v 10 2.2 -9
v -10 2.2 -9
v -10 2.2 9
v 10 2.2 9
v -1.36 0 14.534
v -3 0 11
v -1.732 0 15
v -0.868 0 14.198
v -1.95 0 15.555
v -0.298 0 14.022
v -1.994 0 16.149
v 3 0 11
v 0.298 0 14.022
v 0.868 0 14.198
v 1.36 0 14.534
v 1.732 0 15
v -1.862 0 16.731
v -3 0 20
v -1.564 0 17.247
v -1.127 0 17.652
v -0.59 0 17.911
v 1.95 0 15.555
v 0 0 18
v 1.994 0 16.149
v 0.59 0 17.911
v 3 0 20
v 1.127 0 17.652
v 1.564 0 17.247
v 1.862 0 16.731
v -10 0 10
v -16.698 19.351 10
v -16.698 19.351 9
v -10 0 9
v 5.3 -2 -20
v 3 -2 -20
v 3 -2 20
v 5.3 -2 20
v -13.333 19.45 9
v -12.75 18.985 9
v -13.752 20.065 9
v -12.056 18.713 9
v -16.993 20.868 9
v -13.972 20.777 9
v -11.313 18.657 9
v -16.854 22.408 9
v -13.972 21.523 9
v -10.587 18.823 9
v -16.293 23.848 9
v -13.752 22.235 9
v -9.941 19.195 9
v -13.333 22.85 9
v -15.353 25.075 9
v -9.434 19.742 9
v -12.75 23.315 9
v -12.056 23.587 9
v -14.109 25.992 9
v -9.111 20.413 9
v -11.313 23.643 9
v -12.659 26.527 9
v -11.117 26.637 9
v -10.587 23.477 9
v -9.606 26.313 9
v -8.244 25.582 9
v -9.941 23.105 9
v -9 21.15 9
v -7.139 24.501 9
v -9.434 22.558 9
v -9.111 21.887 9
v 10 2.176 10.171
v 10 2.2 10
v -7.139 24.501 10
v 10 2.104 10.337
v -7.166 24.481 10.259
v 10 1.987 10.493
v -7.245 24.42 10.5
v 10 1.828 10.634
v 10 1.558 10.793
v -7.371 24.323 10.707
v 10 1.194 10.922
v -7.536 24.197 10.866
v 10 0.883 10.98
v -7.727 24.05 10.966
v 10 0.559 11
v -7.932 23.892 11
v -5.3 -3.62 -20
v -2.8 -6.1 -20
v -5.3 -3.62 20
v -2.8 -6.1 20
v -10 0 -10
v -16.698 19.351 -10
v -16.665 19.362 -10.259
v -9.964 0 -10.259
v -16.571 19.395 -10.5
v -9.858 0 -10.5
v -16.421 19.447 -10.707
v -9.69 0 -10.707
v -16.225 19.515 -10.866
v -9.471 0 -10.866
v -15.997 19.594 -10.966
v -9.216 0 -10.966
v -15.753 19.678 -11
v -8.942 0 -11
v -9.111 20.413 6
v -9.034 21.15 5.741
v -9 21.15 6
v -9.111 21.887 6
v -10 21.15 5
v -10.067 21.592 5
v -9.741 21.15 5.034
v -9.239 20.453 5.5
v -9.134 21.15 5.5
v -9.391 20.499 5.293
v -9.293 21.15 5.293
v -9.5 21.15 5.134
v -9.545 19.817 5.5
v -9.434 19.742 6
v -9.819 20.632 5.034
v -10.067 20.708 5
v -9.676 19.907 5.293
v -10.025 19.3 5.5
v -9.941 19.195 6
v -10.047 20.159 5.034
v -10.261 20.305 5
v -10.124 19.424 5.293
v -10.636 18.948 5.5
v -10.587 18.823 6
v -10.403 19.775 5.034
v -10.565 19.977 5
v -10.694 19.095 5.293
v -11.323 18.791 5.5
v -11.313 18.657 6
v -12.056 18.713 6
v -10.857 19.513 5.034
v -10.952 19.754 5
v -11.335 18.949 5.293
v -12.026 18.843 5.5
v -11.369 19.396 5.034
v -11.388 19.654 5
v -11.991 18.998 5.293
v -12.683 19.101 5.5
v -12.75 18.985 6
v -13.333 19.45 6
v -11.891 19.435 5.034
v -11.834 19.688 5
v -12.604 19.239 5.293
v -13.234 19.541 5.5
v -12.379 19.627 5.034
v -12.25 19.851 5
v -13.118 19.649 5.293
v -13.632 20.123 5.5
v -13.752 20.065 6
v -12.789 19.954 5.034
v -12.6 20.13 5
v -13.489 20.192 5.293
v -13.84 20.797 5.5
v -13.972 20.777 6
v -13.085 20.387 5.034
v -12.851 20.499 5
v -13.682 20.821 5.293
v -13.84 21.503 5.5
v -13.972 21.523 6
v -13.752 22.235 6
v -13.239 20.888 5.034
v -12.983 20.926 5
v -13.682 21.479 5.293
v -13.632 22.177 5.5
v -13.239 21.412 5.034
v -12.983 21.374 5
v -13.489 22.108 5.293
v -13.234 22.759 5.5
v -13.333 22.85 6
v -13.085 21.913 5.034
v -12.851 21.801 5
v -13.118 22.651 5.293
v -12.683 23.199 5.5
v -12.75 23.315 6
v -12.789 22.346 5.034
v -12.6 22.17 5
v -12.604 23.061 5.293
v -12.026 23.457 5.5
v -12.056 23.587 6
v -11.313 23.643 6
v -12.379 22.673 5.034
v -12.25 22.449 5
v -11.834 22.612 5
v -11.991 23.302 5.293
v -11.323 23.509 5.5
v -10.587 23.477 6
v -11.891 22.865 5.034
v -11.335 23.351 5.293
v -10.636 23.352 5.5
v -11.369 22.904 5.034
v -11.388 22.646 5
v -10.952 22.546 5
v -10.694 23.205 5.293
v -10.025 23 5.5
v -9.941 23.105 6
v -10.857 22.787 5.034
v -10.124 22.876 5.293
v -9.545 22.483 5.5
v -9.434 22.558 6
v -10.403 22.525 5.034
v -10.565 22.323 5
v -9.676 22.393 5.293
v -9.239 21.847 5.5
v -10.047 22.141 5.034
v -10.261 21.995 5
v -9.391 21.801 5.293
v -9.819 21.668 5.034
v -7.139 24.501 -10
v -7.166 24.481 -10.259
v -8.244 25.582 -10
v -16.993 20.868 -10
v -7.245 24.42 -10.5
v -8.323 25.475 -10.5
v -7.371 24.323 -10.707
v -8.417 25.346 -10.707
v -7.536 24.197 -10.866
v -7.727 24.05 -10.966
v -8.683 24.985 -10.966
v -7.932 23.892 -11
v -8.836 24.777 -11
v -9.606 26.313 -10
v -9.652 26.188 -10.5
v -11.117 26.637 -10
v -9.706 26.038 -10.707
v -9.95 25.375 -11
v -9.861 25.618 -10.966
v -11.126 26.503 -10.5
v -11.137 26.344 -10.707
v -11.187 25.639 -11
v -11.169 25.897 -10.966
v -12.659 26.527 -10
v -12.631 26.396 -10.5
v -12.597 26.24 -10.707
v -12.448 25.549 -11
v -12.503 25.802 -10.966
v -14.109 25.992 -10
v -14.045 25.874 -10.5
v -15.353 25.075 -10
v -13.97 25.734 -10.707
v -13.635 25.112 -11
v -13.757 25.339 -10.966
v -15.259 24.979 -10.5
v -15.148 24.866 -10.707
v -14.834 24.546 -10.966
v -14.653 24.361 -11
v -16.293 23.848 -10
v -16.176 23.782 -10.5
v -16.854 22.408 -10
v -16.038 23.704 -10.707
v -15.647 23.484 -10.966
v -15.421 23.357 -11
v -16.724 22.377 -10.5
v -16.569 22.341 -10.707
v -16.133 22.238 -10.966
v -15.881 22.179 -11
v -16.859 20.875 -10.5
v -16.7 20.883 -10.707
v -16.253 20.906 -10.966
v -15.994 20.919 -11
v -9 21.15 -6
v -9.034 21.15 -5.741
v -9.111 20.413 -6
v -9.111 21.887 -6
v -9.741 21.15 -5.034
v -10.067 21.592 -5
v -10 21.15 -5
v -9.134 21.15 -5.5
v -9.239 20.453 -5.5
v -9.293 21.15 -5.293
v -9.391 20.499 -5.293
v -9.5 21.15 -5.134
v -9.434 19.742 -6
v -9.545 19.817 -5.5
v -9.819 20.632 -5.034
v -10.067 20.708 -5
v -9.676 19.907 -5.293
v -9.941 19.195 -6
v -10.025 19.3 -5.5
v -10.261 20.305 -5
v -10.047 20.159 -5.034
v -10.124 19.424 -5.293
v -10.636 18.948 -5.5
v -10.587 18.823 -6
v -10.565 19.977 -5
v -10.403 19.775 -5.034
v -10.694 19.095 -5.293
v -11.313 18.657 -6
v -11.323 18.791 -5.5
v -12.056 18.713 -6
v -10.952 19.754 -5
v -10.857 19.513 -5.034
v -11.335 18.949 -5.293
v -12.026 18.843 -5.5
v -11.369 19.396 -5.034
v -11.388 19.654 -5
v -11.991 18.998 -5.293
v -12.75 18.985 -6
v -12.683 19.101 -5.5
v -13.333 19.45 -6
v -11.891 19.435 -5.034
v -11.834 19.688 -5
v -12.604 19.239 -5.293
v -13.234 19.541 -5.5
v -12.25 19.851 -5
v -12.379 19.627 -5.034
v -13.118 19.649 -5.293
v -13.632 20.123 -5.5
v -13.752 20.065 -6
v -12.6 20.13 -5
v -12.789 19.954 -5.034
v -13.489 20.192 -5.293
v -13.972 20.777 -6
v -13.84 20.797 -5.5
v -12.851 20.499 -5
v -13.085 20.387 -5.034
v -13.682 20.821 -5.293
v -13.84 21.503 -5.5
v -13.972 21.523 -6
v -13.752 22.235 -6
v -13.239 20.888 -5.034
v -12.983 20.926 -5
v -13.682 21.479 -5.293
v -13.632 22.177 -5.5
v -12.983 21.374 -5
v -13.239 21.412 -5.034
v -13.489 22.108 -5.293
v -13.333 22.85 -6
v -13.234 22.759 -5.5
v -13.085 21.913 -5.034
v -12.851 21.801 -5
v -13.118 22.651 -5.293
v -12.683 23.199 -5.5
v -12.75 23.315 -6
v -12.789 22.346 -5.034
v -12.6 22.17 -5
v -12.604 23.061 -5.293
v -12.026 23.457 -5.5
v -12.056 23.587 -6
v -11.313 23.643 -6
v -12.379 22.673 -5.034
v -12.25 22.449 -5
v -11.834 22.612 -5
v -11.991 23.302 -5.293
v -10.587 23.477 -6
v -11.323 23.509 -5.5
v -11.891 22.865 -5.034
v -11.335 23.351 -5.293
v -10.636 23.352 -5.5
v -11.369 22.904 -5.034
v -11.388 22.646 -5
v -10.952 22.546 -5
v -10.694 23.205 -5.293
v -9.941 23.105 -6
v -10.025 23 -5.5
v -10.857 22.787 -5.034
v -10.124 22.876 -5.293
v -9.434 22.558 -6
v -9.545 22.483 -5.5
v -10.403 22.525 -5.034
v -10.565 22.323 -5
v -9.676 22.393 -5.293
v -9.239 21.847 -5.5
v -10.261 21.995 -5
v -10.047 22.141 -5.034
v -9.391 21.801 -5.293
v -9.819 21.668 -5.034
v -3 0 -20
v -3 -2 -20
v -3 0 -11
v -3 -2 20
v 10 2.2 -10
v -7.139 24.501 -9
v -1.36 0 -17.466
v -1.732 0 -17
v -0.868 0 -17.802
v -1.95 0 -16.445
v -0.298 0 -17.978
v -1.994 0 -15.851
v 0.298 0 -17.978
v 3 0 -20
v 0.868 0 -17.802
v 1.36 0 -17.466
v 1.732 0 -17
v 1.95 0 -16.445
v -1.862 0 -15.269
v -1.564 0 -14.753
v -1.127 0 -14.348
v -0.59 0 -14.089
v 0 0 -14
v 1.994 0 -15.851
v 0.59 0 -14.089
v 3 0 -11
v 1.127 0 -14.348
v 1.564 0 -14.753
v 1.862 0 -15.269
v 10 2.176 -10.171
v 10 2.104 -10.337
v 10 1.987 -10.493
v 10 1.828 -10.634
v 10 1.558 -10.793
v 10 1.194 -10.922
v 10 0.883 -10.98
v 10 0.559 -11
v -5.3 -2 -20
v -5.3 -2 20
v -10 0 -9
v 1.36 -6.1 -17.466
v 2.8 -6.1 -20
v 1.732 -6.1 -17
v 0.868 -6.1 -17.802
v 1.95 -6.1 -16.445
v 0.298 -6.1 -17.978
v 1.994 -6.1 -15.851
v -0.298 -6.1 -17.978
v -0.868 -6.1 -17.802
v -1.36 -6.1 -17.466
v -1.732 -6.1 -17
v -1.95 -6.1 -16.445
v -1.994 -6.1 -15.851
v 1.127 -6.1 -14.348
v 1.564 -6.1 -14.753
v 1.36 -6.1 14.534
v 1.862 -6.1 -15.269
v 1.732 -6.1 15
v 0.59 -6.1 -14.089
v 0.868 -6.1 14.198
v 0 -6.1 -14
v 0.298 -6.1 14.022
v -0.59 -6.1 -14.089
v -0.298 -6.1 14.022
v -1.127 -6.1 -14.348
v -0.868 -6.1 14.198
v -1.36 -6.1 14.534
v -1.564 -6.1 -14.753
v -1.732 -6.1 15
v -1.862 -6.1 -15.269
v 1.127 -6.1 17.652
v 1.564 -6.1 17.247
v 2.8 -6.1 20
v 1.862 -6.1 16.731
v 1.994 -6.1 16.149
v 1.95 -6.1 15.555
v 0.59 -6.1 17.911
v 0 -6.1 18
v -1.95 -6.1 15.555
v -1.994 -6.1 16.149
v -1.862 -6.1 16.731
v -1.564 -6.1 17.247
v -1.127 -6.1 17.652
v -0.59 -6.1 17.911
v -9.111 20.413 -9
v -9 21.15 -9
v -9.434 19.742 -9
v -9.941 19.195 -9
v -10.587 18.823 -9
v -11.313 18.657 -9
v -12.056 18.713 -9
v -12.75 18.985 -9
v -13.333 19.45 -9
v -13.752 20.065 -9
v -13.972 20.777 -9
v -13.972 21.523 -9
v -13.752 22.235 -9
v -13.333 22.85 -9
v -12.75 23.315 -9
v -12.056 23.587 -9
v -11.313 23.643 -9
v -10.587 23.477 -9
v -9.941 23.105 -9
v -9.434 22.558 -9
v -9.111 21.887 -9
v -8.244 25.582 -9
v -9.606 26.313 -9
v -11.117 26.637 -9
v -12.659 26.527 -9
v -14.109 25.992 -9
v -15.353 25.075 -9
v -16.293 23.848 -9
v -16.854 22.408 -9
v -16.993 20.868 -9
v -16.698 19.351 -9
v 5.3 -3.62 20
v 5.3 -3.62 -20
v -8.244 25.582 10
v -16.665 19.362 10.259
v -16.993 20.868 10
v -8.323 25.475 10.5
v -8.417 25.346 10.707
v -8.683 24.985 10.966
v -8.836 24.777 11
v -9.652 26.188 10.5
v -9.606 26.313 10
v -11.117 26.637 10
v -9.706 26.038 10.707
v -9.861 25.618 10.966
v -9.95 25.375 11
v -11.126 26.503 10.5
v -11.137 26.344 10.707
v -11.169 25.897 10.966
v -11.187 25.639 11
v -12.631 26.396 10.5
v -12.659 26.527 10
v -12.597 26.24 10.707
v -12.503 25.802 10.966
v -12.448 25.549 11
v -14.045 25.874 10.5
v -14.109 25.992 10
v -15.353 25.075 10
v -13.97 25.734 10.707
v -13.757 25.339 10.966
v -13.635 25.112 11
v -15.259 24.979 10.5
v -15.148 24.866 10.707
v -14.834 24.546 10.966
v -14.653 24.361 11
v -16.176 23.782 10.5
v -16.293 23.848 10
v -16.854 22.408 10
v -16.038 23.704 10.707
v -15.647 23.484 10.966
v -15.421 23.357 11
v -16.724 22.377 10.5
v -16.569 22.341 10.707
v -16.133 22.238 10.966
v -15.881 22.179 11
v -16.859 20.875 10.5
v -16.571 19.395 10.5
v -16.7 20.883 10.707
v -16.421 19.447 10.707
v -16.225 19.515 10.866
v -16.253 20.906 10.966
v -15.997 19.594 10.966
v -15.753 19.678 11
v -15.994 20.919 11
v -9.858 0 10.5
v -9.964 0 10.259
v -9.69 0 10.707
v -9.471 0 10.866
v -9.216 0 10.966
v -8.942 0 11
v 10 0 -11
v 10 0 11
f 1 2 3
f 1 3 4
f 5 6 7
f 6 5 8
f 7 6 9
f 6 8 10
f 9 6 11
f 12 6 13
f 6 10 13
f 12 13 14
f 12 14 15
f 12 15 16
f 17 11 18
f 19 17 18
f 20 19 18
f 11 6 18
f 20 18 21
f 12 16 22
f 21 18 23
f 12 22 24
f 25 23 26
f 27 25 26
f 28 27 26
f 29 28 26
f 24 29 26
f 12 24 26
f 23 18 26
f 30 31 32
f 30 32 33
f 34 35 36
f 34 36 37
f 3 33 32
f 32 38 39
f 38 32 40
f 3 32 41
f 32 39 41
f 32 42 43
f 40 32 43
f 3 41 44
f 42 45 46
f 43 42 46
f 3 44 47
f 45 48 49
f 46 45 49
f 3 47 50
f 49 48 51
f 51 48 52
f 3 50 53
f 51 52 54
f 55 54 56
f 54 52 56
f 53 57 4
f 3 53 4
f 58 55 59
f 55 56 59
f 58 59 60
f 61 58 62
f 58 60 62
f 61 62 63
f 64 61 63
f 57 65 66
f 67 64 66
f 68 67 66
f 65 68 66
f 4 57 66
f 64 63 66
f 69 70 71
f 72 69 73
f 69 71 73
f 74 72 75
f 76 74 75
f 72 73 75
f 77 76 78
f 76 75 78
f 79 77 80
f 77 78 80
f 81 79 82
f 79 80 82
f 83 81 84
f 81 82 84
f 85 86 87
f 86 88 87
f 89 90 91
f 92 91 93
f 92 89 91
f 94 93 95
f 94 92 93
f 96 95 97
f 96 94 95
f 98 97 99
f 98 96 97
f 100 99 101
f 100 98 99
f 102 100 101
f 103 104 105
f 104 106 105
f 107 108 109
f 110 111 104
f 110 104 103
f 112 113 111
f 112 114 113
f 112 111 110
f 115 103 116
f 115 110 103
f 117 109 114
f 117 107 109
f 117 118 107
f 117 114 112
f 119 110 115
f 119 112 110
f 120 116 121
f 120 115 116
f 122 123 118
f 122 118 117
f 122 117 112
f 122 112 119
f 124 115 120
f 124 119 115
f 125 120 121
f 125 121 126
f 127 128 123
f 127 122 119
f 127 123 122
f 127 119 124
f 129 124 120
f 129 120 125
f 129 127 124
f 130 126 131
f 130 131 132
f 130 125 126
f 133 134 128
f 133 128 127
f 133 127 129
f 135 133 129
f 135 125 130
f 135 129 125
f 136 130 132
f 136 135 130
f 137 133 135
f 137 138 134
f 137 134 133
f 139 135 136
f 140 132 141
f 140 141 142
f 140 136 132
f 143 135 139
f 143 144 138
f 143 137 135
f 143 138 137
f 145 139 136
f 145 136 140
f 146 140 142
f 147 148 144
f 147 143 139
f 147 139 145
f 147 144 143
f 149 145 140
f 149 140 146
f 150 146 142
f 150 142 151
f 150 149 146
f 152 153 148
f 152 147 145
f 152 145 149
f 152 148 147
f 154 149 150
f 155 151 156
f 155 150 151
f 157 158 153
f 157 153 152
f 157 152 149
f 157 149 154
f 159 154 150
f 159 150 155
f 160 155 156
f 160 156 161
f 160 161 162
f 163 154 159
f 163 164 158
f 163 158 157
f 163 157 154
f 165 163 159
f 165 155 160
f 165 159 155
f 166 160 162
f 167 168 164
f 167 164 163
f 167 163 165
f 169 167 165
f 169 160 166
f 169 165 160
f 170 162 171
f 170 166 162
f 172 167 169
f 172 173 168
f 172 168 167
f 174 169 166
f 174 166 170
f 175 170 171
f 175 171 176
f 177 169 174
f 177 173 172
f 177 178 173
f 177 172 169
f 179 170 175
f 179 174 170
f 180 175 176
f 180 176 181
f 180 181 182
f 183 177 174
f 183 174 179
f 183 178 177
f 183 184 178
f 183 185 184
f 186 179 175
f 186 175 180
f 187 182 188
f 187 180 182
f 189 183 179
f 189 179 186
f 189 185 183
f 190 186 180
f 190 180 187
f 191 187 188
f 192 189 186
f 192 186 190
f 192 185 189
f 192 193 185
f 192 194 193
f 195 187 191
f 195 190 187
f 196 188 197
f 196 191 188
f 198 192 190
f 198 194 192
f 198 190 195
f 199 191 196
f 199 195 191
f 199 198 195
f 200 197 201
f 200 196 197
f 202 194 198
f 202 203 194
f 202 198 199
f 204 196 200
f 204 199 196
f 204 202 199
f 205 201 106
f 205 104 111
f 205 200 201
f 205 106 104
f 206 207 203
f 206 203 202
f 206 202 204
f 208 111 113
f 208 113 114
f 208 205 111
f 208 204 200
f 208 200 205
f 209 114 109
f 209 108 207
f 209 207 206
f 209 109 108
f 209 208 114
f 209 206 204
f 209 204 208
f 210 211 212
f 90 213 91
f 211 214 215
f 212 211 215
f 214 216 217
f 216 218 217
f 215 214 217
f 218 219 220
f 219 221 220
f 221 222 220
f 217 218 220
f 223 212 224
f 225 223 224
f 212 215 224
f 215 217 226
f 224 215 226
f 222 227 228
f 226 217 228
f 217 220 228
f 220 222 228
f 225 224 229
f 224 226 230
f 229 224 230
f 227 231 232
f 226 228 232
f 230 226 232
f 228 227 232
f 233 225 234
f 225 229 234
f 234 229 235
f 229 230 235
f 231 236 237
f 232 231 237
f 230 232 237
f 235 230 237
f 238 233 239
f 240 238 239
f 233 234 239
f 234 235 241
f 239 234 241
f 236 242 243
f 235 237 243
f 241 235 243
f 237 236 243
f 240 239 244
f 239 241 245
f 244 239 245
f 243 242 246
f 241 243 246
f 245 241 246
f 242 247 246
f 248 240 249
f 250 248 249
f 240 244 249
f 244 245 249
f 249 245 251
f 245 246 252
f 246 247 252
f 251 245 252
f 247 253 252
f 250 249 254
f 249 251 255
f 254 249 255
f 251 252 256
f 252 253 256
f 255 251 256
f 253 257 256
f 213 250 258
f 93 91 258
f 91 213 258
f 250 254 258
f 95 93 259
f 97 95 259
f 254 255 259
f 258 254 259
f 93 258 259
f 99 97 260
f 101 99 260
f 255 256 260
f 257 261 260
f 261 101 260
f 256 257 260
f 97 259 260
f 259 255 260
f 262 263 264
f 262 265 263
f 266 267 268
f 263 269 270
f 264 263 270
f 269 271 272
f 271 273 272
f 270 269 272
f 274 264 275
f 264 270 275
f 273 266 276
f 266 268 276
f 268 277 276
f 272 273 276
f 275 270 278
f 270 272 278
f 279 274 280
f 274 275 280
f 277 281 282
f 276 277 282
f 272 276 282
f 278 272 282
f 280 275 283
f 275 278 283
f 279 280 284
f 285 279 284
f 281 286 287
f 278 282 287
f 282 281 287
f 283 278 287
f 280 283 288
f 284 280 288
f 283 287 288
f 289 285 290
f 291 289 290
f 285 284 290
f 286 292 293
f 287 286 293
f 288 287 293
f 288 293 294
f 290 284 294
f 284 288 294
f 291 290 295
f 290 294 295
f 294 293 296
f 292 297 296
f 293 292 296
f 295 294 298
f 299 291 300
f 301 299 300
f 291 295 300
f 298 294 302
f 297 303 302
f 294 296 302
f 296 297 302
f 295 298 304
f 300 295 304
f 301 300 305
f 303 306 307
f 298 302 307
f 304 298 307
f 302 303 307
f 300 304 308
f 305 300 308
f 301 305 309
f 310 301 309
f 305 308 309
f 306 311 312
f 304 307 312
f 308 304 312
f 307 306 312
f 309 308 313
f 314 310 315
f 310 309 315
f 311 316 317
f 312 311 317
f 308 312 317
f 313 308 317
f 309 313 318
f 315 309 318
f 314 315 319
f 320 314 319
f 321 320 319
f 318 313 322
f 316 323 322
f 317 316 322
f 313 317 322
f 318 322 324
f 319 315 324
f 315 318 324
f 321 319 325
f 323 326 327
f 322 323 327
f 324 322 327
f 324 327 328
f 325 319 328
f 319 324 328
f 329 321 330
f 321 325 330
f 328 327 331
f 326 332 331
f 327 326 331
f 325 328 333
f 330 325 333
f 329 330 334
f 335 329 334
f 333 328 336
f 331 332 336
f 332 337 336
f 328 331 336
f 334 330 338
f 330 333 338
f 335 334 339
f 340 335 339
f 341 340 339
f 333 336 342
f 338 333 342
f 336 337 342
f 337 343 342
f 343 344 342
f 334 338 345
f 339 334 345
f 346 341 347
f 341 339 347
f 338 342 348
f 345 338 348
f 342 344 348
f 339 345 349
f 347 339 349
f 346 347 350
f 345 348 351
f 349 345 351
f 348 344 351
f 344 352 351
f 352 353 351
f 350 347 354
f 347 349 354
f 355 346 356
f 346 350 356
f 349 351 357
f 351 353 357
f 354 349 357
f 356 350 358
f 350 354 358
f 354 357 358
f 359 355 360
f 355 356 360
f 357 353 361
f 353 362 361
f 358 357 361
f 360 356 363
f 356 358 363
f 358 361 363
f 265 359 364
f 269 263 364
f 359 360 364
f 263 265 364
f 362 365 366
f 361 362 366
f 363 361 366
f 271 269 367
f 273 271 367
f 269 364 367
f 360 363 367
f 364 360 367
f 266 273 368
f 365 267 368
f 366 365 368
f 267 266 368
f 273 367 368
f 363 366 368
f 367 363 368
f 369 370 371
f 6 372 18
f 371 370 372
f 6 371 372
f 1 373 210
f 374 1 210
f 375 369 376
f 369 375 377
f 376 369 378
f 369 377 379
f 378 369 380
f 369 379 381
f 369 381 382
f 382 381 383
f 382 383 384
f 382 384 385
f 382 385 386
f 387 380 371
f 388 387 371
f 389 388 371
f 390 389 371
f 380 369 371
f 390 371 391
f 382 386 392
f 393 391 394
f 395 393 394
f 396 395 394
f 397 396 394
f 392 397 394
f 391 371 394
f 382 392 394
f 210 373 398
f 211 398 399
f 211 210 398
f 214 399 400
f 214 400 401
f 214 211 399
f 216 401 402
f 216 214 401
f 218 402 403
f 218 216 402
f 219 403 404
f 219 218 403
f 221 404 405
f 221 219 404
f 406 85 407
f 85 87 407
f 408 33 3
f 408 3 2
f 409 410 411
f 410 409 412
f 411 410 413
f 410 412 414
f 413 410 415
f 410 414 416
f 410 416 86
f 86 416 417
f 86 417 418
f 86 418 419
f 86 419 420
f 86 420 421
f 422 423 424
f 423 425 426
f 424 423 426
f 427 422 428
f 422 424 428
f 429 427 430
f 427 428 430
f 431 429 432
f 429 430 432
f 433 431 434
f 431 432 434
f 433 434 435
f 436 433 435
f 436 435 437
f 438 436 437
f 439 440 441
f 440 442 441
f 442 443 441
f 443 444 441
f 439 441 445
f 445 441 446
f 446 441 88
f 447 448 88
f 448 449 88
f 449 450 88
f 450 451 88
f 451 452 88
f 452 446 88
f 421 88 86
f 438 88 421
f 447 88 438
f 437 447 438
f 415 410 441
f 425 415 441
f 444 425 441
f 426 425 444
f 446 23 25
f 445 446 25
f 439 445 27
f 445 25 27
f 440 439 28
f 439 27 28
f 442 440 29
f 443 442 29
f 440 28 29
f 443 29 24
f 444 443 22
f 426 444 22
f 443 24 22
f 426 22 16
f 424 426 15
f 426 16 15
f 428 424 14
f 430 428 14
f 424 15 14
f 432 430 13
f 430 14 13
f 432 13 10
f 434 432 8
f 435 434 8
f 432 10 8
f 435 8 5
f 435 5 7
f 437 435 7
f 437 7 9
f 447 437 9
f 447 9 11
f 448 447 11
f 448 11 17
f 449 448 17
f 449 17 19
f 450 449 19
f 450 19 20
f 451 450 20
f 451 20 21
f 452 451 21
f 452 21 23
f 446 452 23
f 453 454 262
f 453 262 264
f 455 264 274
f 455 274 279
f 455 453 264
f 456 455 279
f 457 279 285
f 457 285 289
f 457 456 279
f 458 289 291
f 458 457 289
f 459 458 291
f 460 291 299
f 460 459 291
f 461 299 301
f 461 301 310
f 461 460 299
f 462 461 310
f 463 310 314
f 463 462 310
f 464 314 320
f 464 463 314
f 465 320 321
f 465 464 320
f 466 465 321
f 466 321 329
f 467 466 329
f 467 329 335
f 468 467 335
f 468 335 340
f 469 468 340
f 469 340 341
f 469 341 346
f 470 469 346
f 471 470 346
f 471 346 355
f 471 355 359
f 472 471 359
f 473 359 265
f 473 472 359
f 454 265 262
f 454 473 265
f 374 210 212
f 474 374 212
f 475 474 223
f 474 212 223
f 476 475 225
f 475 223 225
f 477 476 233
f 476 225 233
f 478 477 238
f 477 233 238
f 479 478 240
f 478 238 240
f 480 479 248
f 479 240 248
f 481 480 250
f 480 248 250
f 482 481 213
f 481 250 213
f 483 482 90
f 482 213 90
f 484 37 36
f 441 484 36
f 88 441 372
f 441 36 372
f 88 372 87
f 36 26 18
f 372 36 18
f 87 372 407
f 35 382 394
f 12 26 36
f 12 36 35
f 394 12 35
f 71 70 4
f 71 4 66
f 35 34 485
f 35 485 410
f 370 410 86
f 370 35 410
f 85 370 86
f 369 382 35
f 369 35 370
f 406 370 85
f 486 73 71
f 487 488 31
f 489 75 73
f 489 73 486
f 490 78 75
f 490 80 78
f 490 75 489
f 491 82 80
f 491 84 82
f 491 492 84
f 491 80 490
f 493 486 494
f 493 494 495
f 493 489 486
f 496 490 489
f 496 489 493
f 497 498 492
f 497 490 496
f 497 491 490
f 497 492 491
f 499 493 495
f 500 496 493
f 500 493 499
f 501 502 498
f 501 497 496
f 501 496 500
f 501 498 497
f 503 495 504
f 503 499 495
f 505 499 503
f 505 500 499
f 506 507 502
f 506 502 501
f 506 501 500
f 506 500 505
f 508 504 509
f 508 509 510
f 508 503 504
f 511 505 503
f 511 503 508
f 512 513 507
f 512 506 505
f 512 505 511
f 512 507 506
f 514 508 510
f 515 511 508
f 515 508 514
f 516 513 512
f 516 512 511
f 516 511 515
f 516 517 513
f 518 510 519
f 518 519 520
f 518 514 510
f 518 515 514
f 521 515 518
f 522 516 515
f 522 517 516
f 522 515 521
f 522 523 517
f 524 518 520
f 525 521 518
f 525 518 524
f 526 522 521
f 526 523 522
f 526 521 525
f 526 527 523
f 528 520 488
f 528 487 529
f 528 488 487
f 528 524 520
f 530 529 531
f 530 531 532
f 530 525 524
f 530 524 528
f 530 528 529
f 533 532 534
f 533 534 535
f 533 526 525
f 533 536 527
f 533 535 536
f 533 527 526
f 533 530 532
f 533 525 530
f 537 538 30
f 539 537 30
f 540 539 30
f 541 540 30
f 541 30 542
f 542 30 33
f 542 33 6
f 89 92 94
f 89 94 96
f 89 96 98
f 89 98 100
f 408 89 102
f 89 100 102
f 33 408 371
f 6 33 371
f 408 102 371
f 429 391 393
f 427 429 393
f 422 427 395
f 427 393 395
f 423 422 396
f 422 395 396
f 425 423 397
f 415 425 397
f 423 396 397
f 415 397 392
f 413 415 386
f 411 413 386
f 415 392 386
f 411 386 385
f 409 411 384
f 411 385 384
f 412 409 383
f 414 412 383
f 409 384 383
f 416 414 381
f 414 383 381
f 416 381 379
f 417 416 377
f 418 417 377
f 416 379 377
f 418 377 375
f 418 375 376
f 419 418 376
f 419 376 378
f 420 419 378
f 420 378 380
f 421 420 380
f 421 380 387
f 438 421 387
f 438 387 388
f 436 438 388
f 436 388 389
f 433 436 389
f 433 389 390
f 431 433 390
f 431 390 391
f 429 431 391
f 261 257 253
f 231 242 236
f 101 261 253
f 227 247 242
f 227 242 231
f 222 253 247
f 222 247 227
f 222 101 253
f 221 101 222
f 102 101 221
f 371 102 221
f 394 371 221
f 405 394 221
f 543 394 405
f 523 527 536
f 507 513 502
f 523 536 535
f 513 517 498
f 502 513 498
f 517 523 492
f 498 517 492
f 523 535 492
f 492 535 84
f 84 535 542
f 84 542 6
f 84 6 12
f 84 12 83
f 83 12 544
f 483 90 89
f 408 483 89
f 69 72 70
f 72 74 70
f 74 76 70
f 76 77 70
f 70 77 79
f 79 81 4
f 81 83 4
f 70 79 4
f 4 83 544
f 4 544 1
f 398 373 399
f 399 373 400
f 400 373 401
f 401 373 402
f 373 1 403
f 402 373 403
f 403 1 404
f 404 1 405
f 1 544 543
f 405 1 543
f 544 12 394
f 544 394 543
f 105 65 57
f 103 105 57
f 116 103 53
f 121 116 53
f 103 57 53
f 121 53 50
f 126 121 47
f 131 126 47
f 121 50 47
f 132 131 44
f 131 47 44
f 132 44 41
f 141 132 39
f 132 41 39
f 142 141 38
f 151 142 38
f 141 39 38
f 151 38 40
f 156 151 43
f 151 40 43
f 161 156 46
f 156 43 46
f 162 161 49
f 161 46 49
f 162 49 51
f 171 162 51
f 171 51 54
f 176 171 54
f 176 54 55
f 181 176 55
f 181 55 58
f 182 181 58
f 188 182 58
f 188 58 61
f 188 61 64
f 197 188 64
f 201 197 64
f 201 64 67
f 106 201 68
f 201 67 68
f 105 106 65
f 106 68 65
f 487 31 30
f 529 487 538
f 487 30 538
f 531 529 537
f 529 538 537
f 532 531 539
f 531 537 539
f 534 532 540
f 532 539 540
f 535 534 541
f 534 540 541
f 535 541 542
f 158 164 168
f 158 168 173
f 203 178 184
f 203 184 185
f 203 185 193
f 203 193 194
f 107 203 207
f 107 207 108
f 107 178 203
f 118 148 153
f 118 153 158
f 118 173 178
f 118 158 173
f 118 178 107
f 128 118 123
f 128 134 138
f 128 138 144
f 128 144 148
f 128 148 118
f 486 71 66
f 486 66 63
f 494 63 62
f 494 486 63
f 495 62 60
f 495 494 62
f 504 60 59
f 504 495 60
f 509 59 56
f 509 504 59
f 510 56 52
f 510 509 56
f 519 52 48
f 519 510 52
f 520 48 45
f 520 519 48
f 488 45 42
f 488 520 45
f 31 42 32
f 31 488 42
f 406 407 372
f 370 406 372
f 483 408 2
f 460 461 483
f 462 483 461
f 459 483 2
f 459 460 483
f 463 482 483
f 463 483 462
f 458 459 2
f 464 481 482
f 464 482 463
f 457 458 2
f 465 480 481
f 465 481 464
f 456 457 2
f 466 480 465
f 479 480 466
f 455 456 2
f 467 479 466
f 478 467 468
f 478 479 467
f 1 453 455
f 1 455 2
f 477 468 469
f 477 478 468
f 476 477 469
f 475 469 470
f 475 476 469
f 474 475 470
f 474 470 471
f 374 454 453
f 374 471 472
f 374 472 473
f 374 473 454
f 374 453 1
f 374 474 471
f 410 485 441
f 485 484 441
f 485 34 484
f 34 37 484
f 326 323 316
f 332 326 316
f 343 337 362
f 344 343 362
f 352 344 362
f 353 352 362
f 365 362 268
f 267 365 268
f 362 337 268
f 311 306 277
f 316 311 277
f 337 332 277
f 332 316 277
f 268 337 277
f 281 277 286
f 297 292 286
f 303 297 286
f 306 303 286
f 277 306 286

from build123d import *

# Parameters (mm, degrees)
BOSS_EXTRUDE1_DEPTH  = 20
SKETCH2_W            = 20
SKETCH2_H            = 22
BOSS_EXTRUDE2_DEPTH  = 2.2
BOSS_EXTRUDE3_DEPTH  = 2
SKETCH5_R            = 2.5
BOSS_EXTRUDE4_DEPTH  = 4
FILLET1_R            = 1
FILLET2_R            = 1
FILLET1_OF_MIRROR1_R = 1
FILLET2_OF_MIRROR1_R = 1
SKETCH6_R            = 2
CUT_EXTRUDE1_DEPTH   = 38.406182644


with BuildPart() as part:
    # Sketch1 → Boss-Extrude1 (new, symmetric)
    with BuildSketch(Plane.XY):
        Polygon((-3, 0), (3, 0), (3, -2), (5.3, -2), (5.3, -3.62), (2.8, -6.1), (-2.8, -6.1), (-5.3, -3.62), (-5.3, -2), (-3, -2), align=None)
    extrude(amount=BOSS_EXTRUDE1_DEPTH, both=True)

    # Sketch2 → Boss-Extrude2 (add)
    with BuildSketch(Plane(origin=(0, 0, 0), x_dir=(1, 0, 0), z_dir=(0, 1, 0))):
        Rectangle(SKETCH2_W, SKETCH2_H)
    extrude(amount=BOSS_EXTRUDE2_DEPTH)

    # Sketch4 → Boss-Extrude3 (add)
    with BuildSketch(Plane.XY.offset(11)):
        with BuildLine():
            Line((-3, 0), (3, 0))
            Line((3, 0), (10, 0))
            Line((10, 0), (10, 2.2))
            Line((10, 2.2), (-7.139065943, 24.501455527))
            ThreePointArc((-7.139065943, 24.501455527), (-14.108916266, 25.991854595), (-16.69750329, 19.351122698))
            Line((-16.69750329, 19.351122698), (-10, 0))
            Line((-10, 0), (-3, 0))
        make_face()
    boss_extrude3 = extrude(amount=-BOSS_EXTRUDE3_DEPTH)

    # Sketch5 → Boss-Extrude4 (add)
    with BuildSketch(Plane(origin=(0, 0, 9), x_dir=(-1, 0, 0), z_dir=(0, 0, -1))):
        with Locations(Location((11.5, 21.15, 0), (0, 0, 180))):
            Circle(SKETCH5_R)
    boss_extrude4 = extrude(amount=BOSS_EXTRUDE4_DEPTH)

    # Fillet1
    fillet1_edges = [part.edges().sort_by_distance(p)[0] for p in [
        (-14, 21.15, 5),
    ]]
    fillet(fillet1_edges, radius=FILLET1_R)

    # Fillet2
    fillet2_edges = [part.edges().sort_by_distance(p)[0] for p in [
        (1.430467029, 13.350727763, 11),
        (-14.108916266, 25.991854595, 11),
        (-13.348751645, 9.675561349, 11),
    ]]
    fillet(fillet2_edges, radius=FILLET2_R)

    # Mirror1: Boss-Extrude3, Boss-Extrude4 across plane
    add(boss_extrude3.mirror(Plane.XY))
    add(boss_extrude4.mirror(Plane.XY))

    # Fillet1 of Mirror1
    fillet1_of_mirror1_edges = [part.edges().sort_by_distance(p)[0] for p in [
        (-14, 21.15, -5),
    ]]
    fillet(fillet1_of_mirror1_edges, radius=FILLET1_OF_MIRROR1_R)

    # Fillet2 of Mirror1
    fillet2_of_mirror1_edges = [part.edges().sort_by_distance(p)[0] for p in [
        (1.430467029, 13.350727763, -11),
        (-14.108916266, 25.991854595, -11),
        (-13.348751645, 9.675561349, -11),
    ]]
    fillet(fillet2_of_mirror1_edges, radius=FILLET2_OF_MIRROR1_R)

    # Sketch6 → Cut-Extrude1 (cut, through all)
    with BuildSketch(Plane(origin=(0, 0, 0), x_dir=(1, 0, 0), z_dir=(0, 1, 0))):
        with Locations(Location((0, 16, 0), (0, 0, 270))):
            Circle(SKETCH6_R)
        with Locations(Location((0, -16, 0), (0, 0, 270))):
            Circle(SKETCH6_R)
    extrude(amount=-CUT_EXTRUDE1_DEPTH, mode=Mode.SUBTRACT)


solid = part.part
